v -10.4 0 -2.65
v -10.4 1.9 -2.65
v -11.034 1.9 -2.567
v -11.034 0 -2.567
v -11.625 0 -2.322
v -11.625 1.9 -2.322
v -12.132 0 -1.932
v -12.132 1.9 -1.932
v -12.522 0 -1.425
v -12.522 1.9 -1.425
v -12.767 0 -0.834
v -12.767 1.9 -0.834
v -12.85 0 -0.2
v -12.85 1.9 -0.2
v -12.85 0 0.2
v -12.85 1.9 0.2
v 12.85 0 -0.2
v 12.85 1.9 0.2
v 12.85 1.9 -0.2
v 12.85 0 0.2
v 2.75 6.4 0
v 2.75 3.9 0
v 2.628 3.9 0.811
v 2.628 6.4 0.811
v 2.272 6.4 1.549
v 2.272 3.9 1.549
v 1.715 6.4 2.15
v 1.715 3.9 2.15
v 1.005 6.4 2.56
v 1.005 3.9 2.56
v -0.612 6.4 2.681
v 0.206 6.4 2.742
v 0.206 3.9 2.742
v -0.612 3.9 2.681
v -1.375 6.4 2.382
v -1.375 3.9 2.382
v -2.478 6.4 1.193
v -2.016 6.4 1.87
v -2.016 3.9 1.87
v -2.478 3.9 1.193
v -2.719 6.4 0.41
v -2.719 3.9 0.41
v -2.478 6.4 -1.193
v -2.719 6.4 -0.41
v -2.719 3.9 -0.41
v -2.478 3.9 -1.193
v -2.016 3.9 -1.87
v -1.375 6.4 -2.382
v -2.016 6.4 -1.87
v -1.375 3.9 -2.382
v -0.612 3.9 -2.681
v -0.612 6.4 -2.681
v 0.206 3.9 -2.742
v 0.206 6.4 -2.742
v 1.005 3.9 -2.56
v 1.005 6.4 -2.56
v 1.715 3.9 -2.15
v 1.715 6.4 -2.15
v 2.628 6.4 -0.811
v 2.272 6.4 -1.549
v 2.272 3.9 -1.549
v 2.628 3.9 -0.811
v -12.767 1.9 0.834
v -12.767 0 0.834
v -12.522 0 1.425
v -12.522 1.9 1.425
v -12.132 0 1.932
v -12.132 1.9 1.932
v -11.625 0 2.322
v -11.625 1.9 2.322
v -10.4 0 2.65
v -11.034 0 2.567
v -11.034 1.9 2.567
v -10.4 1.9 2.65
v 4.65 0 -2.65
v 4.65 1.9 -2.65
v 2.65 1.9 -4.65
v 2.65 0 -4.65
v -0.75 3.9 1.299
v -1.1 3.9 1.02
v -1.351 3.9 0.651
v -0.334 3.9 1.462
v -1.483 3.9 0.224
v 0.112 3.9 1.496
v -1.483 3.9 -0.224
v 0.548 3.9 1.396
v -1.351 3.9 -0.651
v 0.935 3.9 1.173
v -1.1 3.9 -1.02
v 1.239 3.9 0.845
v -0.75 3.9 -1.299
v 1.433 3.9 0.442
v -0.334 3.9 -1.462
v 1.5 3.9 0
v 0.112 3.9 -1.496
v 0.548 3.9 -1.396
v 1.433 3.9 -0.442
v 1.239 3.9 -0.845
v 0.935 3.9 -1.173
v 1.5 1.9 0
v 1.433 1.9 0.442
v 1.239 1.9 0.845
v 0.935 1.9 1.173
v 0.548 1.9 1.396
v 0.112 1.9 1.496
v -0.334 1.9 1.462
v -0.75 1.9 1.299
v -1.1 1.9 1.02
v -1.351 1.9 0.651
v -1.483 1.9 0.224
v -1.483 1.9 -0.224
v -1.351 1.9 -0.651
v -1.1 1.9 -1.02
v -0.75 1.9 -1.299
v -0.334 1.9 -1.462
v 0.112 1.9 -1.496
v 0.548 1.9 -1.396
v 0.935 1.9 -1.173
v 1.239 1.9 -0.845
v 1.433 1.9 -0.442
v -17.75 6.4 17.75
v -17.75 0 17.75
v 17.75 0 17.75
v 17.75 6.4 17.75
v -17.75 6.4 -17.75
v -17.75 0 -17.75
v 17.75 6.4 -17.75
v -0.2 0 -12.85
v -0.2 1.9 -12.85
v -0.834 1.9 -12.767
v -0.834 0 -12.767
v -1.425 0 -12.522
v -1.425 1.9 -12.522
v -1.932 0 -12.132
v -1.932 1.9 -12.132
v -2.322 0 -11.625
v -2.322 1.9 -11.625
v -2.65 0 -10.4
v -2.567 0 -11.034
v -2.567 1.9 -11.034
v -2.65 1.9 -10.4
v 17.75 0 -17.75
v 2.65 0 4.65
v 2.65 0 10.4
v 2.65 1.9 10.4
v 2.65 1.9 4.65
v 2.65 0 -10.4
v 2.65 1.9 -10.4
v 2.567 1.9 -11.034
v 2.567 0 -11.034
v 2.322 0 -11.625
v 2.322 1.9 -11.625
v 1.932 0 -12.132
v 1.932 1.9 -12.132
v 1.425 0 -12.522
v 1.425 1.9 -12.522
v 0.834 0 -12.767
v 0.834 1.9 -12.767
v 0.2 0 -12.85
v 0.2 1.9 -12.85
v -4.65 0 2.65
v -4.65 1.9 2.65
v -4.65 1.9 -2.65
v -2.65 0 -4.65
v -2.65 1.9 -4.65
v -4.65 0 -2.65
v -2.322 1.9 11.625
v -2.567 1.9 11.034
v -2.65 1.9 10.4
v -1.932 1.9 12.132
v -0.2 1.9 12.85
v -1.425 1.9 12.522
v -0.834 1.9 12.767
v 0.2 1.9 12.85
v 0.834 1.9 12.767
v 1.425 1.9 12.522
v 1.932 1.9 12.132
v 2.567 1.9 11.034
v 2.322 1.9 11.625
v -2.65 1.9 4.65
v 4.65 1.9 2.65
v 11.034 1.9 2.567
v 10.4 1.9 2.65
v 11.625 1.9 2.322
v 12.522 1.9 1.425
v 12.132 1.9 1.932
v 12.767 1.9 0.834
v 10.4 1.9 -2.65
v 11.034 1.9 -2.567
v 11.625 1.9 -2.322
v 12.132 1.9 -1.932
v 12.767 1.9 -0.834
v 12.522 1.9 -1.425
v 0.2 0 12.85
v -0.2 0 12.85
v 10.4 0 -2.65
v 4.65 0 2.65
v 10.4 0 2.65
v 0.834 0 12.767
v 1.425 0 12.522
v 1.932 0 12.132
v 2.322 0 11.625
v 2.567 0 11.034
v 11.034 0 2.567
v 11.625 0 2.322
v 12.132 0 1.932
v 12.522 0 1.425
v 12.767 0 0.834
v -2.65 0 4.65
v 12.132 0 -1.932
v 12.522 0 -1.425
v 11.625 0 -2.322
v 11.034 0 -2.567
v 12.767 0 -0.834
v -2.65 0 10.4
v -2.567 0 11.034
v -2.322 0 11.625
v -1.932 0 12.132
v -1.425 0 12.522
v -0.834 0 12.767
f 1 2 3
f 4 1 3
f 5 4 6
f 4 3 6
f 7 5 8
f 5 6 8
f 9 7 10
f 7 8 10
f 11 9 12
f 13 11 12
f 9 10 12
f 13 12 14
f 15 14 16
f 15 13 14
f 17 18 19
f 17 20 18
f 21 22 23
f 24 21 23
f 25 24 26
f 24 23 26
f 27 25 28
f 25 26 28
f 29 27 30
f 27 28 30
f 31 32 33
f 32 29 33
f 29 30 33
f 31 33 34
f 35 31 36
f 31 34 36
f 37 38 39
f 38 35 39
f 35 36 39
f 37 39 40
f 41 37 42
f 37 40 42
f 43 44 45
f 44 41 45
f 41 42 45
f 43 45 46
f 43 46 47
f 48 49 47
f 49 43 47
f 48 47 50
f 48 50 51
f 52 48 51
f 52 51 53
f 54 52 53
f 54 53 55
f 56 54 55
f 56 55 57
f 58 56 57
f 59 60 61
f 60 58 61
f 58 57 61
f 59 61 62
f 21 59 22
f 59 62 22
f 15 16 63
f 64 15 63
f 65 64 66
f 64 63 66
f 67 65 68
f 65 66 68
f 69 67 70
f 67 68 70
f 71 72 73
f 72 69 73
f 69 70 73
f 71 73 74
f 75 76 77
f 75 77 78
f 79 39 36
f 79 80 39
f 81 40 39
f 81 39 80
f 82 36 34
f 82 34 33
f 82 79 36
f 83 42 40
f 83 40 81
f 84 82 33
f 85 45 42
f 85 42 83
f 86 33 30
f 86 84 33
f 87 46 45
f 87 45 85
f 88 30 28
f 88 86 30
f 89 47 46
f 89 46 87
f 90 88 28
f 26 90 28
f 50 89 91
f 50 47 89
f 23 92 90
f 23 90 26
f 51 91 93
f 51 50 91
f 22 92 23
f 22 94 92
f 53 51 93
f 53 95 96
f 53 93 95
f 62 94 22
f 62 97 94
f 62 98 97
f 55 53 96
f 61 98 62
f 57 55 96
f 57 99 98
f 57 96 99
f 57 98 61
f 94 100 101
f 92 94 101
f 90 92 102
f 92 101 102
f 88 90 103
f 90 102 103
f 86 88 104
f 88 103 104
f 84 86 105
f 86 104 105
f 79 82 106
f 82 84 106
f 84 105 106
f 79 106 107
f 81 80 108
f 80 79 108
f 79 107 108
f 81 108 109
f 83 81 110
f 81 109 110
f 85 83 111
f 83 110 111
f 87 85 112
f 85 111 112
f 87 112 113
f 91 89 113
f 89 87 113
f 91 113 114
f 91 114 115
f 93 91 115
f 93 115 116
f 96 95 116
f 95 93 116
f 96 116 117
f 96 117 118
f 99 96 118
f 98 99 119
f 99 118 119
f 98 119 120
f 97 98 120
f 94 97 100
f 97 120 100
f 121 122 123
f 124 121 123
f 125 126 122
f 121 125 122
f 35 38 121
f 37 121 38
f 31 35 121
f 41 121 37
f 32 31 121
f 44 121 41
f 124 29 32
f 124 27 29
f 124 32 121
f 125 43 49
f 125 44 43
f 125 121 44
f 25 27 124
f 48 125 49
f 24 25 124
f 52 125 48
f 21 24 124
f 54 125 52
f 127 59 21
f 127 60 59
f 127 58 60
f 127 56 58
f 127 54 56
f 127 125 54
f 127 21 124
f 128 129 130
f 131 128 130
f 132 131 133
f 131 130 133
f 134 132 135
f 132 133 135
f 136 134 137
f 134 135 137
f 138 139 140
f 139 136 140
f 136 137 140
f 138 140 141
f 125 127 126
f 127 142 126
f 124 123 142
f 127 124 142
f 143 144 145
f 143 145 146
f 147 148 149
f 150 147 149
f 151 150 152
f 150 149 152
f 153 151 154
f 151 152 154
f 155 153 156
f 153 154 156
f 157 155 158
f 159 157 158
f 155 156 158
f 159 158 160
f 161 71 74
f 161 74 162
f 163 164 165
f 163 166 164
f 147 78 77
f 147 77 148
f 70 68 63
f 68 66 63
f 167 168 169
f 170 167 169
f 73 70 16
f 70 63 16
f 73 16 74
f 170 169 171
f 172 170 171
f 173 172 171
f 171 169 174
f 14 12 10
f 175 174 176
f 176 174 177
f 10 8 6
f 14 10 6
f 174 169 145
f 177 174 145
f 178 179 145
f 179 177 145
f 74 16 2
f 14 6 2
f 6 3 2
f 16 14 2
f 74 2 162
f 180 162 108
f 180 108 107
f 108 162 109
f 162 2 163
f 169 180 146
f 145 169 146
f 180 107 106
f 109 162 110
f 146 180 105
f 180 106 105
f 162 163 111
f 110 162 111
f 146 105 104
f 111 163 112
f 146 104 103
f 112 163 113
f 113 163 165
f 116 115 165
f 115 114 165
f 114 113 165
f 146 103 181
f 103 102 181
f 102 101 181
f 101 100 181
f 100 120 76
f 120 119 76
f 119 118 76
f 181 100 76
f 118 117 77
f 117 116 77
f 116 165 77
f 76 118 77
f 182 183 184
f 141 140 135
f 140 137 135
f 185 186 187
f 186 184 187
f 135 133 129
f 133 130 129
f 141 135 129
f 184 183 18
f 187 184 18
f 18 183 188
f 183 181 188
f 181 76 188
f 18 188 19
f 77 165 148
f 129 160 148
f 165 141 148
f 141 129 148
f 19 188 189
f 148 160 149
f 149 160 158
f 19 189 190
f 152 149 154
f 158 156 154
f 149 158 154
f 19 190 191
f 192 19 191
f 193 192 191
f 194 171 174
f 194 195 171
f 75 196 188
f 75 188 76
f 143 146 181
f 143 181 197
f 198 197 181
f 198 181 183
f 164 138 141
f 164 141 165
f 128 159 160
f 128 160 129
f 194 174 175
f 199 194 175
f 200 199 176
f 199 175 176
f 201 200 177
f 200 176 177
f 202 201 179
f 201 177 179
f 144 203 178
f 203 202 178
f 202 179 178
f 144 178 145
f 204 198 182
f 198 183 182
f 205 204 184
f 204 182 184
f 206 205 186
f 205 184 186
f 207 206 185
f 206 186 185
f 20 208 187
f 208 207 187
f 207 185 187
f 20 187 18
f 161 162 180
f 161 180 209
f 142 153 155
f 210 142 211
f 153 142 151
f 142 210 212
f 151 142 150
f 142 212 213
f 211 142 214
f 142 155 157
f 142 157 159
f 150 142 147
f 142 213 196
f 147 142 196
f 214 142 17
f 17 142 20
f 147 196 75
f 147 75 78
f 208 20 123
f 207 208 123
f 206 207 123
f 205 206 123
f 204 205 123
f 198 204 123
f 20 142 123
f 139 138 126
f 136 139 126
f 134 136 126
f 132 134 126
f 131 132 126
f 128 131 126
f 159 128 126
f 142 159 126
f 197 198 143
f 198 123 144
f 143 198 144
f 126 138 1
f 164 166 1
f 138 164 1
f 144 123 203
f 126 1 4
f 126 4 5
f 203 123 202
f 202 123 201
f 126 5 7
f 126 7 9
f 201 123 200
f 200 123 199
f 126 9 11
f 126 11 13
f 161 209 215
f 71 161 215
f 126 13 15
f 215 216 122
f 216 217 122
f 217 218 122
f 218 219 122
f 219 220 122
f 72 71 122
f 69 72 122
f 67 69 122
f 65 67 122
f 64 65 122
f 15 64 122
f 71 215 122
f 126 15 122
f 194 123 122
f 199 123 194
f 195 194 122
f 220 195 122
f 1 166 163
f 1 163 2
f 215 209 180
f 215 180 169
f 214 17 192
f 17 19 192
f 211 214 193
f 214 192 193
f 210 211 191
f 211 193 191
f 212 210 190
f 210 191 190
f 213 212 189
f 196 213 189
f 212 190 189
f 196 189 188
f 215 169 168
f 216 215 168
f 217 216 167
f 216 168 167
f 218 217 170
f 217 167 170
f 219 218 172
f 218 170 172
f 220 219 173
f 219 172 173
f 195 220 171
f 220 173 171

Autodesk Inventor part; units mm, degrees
ref_plane "YZ Plane" through (0, 0, 0) normal (1, 0, 0) x (0, 1, 0)
ref_plane "XZ Plane" through (0, 0, 0) normal (0, 1, 0) x (-1, 0, 0)
ref_plane "XY Plane" through (0, 0, 0) normal (0, 0, 1) x (1, 0, 0)
sketch "Sketch1" plane through (0, 0, 0) normal (0, 1, 0) x (-1, 0, 0)
  line L0 (-17.75, -17.75) -> (17.75, -17.75)
  line L1 (17.75, -17.75) -> (17.75, 17.75)
  line L2 (17.75, 17.75) -> (-17.75, 17.75)
  line L3 (-17.75, 17.75) -> (-17.75, -17.75)
  line L4 (-17.75, -17.75) -> (17.75, 17.75) construction
  line L5 (17.75, -17.75) -> (-17.75, 17.75) construction
  line L6 (-2.45, -12.65) -> (2.45, -12.65) construction
  line L7 (2.45, -12.65) -> (2.45, 12.65) construction
  line L8 (2.45, 12.65) -> (-2.45, 12.65) construction
  line L9 (-2.45, 12.65) -> (-2.45, -12.65) construction
  line L10 (-2.45, -12.65) -> (2.45, 12.65) construction
  line L11 (2.45, -12.65) -> (-2.45, 12.65) construction
  line L12 (-12.65, -2.45) -> (12.65, -2.45) construction
  line L13 (12.65, -2.45) -> (12.65, 2.45) construction
  line L14 (12.65, 2.45) -> (-12.65, 2.45) construction
  line L15 (-12.65, 2.45) -> (-12.65, -2.45) construction
  line L16 (-12.65, -2.45) -> (12.65, 2.45) construction
  line L17 (12.65, -2.45) -> (-12.65, 2.45) construction
  line L18 (-12.85, -2.65) -> (12.85, -2.65)
  line L19 (12.85, -2.65) -> (12.85, 2.65)
  line L20 (12.85, 2.65) -> (-12.85, 2.65)
  line L21 (-12.85, 2.65) -> (-12.85, -2.65)
  line L22 (-12.85, -2.65) -> (12.85, 2.65) construction
  line L23 (12.85, -2.65) -> (-12.85, 2.65) construction
  line L24 (-2.65, -12.85) -> (2.65, -12.85)
  line L25 (2.65, -12.85) -> (2.65, 12.85)
  line L26 (2.65, 12.85) -> (-2.65, 12.85)
  line L27 (-2.65, 12.85) -> (-2.65, -12.85)
  line L28 (-2.65, -12.85) -> (2.65, 12.85) construction
  line L29 (2.65, -12.85) -> (-2.65, 12.85) construction
  point P0 (0, 0)
  point P1 (0, 0)
  dimension "d0" = 35.5
  dimension "d1" = 4.9
  dimension "d2" = 10.2
  dimension "d3" = 0.2
  dimension "d4" = 0.2
extrude "Extrusion1" add sketch "Sketch1" along normal blind 1.9
sketch "Sketch2" plane through (0, 1.9, 0) normal (0, 1, 0) x (1, 0, 0)
  line L0 (17.75, 17.75) -> (-17.75, 17.75) projected
  line L1 (-17.75, 17.75) -> (-17.75, -17.75) projected
  line L2 (-17.75, -17.75) -> (17.75, -17.75) projected
  line L3 (17.75, -17.75) -> (17.75, 17.75) projected
  circle A0 centre (0, 0) radius 1.5
  dimension "d7" = 3
extrude "Extrusion2" add sketch "Sketch2" along normal blind 2
sketch "Sketch3" plane through (0, 3.9, 0) normal (0, 1, 0) x (1, 0, 0)
  circle A0 centre (0, 0) radius 1.5 projected
  line L0 (17.75, 17.75) -> (-17.75, 17.75) projected
  line L1 (-17.75, 17.75) -> (-17.75, -17.75) projected
  line L2 (-17.75, -17.75) -> (17.75, -17.75) projected
  line L3 (17.75, -17.75) -> (17.75, 17.75) projected
  circle A1 centre (0, 0) radius 2.75
  dimension "d10" = 5.5
extrude "Extrusion3" add sketch "Sketch3" along normal blind 2.5 contours L3 L2 L1 L0
chamfer "Chamfer1" distance 2 angle 45 1 edges at (-2.65, 0.95, -2.65)
fillet "Fillet1" radius 2.45 1 edges at (-12.85, 0.95, -2.65)
fillet "Fillet2" radius 2.45 1 edges at (-2.65, 0.95, -12.85)
chamfer "Chamfer2" distance 2 angle 45 1 edges at (2.65, 0.95, -2.65)
chamfer "Chamfer3" distance 2 angle 45 1 edges at (2.65, 0.95, 2.65)
fillet "Fillet3" radius 2.45 1 edges at (12.85, 0.95, -2.65)
fillet "Fillet4" radius 2.45 1 edges at (2.65, 0.95, -12.85)
fillet "Fillet5" radius 2.45 1 edges at (12.85, 0.95, 2.65)
fillet "Fillet6" radius 2.45 1 edges at (2.65, 0.95, 12.85)
chamfer "Chamfer4" distance 2 angle 45 1 edges at (-2.65, 0.95, 2.65)
fillet "Fillet7" radius 2.45 2 edges at (-2.65, 0.95, 12.85) (-12.85, 0.95, 2.65)
equation "\"d0\" = 3 * ServoArmLength + ServoArmWidth"
equation "\"d1\" = ServoArmWidth"
equation "\"d2\" = ServoArmLength"
equation "\"d3\" = ServoArmSpacing"
equation "\"d4\" = ServoArmSpacing"
equation "\"d5\" = ServoArmThickness"
equation "\"d7\" = ServoArmHoleRequired"
equation "\"d8\" = MinimalThickness"
equation "\"d10\" = ServoArmHeadScrewTrace"
equation "\"d11\" = ServoArmHeadScrewThickness"
equation "\"d13\" = ServoArmInternFillet"
equation "\"d16\" = ServoArmExternFillet"
equation "\"d17\" = ServoArmExternFillet"
equation "\"d18\" = ServoArmInternFillet"
equation "\"d21\" = ServoArmInternFillet"
equation "\"d24\" = ServoArmExternFillet"
equation "\"d25\" = ServoArmExternFillet"
equation "\"d26\" = ServoArmExternFillet"
equation "\"d27\" = ServoArmExternFillet"
equation "\"d28\" = ServoArmInternFillet"
equation "\"d31\" = ServoArmExternFillet"
equation "\"ServoArmLength\" = 10.2"
equation "\"ServoArmWidth\" = 4.9"
equation "\"ServoArmSpacing\" = 0.2"
equation "\"ServoArmThickness\" = 1.9"
equation "\"ServoArmHoleRequired\" = 3"
equation "\"MinimalThickness\" = 2"
equation "\"ServoArmHeadScrewTrace\" = 5.5"
equation "\"ServoArmHeadScrewThickness\" = 2.5"
equation "\"ServoArmInternFillet\" = 2"
equation "\"ServoArmExternFillet\" = 2.45"
properties part number "CoronaArmTrace"
